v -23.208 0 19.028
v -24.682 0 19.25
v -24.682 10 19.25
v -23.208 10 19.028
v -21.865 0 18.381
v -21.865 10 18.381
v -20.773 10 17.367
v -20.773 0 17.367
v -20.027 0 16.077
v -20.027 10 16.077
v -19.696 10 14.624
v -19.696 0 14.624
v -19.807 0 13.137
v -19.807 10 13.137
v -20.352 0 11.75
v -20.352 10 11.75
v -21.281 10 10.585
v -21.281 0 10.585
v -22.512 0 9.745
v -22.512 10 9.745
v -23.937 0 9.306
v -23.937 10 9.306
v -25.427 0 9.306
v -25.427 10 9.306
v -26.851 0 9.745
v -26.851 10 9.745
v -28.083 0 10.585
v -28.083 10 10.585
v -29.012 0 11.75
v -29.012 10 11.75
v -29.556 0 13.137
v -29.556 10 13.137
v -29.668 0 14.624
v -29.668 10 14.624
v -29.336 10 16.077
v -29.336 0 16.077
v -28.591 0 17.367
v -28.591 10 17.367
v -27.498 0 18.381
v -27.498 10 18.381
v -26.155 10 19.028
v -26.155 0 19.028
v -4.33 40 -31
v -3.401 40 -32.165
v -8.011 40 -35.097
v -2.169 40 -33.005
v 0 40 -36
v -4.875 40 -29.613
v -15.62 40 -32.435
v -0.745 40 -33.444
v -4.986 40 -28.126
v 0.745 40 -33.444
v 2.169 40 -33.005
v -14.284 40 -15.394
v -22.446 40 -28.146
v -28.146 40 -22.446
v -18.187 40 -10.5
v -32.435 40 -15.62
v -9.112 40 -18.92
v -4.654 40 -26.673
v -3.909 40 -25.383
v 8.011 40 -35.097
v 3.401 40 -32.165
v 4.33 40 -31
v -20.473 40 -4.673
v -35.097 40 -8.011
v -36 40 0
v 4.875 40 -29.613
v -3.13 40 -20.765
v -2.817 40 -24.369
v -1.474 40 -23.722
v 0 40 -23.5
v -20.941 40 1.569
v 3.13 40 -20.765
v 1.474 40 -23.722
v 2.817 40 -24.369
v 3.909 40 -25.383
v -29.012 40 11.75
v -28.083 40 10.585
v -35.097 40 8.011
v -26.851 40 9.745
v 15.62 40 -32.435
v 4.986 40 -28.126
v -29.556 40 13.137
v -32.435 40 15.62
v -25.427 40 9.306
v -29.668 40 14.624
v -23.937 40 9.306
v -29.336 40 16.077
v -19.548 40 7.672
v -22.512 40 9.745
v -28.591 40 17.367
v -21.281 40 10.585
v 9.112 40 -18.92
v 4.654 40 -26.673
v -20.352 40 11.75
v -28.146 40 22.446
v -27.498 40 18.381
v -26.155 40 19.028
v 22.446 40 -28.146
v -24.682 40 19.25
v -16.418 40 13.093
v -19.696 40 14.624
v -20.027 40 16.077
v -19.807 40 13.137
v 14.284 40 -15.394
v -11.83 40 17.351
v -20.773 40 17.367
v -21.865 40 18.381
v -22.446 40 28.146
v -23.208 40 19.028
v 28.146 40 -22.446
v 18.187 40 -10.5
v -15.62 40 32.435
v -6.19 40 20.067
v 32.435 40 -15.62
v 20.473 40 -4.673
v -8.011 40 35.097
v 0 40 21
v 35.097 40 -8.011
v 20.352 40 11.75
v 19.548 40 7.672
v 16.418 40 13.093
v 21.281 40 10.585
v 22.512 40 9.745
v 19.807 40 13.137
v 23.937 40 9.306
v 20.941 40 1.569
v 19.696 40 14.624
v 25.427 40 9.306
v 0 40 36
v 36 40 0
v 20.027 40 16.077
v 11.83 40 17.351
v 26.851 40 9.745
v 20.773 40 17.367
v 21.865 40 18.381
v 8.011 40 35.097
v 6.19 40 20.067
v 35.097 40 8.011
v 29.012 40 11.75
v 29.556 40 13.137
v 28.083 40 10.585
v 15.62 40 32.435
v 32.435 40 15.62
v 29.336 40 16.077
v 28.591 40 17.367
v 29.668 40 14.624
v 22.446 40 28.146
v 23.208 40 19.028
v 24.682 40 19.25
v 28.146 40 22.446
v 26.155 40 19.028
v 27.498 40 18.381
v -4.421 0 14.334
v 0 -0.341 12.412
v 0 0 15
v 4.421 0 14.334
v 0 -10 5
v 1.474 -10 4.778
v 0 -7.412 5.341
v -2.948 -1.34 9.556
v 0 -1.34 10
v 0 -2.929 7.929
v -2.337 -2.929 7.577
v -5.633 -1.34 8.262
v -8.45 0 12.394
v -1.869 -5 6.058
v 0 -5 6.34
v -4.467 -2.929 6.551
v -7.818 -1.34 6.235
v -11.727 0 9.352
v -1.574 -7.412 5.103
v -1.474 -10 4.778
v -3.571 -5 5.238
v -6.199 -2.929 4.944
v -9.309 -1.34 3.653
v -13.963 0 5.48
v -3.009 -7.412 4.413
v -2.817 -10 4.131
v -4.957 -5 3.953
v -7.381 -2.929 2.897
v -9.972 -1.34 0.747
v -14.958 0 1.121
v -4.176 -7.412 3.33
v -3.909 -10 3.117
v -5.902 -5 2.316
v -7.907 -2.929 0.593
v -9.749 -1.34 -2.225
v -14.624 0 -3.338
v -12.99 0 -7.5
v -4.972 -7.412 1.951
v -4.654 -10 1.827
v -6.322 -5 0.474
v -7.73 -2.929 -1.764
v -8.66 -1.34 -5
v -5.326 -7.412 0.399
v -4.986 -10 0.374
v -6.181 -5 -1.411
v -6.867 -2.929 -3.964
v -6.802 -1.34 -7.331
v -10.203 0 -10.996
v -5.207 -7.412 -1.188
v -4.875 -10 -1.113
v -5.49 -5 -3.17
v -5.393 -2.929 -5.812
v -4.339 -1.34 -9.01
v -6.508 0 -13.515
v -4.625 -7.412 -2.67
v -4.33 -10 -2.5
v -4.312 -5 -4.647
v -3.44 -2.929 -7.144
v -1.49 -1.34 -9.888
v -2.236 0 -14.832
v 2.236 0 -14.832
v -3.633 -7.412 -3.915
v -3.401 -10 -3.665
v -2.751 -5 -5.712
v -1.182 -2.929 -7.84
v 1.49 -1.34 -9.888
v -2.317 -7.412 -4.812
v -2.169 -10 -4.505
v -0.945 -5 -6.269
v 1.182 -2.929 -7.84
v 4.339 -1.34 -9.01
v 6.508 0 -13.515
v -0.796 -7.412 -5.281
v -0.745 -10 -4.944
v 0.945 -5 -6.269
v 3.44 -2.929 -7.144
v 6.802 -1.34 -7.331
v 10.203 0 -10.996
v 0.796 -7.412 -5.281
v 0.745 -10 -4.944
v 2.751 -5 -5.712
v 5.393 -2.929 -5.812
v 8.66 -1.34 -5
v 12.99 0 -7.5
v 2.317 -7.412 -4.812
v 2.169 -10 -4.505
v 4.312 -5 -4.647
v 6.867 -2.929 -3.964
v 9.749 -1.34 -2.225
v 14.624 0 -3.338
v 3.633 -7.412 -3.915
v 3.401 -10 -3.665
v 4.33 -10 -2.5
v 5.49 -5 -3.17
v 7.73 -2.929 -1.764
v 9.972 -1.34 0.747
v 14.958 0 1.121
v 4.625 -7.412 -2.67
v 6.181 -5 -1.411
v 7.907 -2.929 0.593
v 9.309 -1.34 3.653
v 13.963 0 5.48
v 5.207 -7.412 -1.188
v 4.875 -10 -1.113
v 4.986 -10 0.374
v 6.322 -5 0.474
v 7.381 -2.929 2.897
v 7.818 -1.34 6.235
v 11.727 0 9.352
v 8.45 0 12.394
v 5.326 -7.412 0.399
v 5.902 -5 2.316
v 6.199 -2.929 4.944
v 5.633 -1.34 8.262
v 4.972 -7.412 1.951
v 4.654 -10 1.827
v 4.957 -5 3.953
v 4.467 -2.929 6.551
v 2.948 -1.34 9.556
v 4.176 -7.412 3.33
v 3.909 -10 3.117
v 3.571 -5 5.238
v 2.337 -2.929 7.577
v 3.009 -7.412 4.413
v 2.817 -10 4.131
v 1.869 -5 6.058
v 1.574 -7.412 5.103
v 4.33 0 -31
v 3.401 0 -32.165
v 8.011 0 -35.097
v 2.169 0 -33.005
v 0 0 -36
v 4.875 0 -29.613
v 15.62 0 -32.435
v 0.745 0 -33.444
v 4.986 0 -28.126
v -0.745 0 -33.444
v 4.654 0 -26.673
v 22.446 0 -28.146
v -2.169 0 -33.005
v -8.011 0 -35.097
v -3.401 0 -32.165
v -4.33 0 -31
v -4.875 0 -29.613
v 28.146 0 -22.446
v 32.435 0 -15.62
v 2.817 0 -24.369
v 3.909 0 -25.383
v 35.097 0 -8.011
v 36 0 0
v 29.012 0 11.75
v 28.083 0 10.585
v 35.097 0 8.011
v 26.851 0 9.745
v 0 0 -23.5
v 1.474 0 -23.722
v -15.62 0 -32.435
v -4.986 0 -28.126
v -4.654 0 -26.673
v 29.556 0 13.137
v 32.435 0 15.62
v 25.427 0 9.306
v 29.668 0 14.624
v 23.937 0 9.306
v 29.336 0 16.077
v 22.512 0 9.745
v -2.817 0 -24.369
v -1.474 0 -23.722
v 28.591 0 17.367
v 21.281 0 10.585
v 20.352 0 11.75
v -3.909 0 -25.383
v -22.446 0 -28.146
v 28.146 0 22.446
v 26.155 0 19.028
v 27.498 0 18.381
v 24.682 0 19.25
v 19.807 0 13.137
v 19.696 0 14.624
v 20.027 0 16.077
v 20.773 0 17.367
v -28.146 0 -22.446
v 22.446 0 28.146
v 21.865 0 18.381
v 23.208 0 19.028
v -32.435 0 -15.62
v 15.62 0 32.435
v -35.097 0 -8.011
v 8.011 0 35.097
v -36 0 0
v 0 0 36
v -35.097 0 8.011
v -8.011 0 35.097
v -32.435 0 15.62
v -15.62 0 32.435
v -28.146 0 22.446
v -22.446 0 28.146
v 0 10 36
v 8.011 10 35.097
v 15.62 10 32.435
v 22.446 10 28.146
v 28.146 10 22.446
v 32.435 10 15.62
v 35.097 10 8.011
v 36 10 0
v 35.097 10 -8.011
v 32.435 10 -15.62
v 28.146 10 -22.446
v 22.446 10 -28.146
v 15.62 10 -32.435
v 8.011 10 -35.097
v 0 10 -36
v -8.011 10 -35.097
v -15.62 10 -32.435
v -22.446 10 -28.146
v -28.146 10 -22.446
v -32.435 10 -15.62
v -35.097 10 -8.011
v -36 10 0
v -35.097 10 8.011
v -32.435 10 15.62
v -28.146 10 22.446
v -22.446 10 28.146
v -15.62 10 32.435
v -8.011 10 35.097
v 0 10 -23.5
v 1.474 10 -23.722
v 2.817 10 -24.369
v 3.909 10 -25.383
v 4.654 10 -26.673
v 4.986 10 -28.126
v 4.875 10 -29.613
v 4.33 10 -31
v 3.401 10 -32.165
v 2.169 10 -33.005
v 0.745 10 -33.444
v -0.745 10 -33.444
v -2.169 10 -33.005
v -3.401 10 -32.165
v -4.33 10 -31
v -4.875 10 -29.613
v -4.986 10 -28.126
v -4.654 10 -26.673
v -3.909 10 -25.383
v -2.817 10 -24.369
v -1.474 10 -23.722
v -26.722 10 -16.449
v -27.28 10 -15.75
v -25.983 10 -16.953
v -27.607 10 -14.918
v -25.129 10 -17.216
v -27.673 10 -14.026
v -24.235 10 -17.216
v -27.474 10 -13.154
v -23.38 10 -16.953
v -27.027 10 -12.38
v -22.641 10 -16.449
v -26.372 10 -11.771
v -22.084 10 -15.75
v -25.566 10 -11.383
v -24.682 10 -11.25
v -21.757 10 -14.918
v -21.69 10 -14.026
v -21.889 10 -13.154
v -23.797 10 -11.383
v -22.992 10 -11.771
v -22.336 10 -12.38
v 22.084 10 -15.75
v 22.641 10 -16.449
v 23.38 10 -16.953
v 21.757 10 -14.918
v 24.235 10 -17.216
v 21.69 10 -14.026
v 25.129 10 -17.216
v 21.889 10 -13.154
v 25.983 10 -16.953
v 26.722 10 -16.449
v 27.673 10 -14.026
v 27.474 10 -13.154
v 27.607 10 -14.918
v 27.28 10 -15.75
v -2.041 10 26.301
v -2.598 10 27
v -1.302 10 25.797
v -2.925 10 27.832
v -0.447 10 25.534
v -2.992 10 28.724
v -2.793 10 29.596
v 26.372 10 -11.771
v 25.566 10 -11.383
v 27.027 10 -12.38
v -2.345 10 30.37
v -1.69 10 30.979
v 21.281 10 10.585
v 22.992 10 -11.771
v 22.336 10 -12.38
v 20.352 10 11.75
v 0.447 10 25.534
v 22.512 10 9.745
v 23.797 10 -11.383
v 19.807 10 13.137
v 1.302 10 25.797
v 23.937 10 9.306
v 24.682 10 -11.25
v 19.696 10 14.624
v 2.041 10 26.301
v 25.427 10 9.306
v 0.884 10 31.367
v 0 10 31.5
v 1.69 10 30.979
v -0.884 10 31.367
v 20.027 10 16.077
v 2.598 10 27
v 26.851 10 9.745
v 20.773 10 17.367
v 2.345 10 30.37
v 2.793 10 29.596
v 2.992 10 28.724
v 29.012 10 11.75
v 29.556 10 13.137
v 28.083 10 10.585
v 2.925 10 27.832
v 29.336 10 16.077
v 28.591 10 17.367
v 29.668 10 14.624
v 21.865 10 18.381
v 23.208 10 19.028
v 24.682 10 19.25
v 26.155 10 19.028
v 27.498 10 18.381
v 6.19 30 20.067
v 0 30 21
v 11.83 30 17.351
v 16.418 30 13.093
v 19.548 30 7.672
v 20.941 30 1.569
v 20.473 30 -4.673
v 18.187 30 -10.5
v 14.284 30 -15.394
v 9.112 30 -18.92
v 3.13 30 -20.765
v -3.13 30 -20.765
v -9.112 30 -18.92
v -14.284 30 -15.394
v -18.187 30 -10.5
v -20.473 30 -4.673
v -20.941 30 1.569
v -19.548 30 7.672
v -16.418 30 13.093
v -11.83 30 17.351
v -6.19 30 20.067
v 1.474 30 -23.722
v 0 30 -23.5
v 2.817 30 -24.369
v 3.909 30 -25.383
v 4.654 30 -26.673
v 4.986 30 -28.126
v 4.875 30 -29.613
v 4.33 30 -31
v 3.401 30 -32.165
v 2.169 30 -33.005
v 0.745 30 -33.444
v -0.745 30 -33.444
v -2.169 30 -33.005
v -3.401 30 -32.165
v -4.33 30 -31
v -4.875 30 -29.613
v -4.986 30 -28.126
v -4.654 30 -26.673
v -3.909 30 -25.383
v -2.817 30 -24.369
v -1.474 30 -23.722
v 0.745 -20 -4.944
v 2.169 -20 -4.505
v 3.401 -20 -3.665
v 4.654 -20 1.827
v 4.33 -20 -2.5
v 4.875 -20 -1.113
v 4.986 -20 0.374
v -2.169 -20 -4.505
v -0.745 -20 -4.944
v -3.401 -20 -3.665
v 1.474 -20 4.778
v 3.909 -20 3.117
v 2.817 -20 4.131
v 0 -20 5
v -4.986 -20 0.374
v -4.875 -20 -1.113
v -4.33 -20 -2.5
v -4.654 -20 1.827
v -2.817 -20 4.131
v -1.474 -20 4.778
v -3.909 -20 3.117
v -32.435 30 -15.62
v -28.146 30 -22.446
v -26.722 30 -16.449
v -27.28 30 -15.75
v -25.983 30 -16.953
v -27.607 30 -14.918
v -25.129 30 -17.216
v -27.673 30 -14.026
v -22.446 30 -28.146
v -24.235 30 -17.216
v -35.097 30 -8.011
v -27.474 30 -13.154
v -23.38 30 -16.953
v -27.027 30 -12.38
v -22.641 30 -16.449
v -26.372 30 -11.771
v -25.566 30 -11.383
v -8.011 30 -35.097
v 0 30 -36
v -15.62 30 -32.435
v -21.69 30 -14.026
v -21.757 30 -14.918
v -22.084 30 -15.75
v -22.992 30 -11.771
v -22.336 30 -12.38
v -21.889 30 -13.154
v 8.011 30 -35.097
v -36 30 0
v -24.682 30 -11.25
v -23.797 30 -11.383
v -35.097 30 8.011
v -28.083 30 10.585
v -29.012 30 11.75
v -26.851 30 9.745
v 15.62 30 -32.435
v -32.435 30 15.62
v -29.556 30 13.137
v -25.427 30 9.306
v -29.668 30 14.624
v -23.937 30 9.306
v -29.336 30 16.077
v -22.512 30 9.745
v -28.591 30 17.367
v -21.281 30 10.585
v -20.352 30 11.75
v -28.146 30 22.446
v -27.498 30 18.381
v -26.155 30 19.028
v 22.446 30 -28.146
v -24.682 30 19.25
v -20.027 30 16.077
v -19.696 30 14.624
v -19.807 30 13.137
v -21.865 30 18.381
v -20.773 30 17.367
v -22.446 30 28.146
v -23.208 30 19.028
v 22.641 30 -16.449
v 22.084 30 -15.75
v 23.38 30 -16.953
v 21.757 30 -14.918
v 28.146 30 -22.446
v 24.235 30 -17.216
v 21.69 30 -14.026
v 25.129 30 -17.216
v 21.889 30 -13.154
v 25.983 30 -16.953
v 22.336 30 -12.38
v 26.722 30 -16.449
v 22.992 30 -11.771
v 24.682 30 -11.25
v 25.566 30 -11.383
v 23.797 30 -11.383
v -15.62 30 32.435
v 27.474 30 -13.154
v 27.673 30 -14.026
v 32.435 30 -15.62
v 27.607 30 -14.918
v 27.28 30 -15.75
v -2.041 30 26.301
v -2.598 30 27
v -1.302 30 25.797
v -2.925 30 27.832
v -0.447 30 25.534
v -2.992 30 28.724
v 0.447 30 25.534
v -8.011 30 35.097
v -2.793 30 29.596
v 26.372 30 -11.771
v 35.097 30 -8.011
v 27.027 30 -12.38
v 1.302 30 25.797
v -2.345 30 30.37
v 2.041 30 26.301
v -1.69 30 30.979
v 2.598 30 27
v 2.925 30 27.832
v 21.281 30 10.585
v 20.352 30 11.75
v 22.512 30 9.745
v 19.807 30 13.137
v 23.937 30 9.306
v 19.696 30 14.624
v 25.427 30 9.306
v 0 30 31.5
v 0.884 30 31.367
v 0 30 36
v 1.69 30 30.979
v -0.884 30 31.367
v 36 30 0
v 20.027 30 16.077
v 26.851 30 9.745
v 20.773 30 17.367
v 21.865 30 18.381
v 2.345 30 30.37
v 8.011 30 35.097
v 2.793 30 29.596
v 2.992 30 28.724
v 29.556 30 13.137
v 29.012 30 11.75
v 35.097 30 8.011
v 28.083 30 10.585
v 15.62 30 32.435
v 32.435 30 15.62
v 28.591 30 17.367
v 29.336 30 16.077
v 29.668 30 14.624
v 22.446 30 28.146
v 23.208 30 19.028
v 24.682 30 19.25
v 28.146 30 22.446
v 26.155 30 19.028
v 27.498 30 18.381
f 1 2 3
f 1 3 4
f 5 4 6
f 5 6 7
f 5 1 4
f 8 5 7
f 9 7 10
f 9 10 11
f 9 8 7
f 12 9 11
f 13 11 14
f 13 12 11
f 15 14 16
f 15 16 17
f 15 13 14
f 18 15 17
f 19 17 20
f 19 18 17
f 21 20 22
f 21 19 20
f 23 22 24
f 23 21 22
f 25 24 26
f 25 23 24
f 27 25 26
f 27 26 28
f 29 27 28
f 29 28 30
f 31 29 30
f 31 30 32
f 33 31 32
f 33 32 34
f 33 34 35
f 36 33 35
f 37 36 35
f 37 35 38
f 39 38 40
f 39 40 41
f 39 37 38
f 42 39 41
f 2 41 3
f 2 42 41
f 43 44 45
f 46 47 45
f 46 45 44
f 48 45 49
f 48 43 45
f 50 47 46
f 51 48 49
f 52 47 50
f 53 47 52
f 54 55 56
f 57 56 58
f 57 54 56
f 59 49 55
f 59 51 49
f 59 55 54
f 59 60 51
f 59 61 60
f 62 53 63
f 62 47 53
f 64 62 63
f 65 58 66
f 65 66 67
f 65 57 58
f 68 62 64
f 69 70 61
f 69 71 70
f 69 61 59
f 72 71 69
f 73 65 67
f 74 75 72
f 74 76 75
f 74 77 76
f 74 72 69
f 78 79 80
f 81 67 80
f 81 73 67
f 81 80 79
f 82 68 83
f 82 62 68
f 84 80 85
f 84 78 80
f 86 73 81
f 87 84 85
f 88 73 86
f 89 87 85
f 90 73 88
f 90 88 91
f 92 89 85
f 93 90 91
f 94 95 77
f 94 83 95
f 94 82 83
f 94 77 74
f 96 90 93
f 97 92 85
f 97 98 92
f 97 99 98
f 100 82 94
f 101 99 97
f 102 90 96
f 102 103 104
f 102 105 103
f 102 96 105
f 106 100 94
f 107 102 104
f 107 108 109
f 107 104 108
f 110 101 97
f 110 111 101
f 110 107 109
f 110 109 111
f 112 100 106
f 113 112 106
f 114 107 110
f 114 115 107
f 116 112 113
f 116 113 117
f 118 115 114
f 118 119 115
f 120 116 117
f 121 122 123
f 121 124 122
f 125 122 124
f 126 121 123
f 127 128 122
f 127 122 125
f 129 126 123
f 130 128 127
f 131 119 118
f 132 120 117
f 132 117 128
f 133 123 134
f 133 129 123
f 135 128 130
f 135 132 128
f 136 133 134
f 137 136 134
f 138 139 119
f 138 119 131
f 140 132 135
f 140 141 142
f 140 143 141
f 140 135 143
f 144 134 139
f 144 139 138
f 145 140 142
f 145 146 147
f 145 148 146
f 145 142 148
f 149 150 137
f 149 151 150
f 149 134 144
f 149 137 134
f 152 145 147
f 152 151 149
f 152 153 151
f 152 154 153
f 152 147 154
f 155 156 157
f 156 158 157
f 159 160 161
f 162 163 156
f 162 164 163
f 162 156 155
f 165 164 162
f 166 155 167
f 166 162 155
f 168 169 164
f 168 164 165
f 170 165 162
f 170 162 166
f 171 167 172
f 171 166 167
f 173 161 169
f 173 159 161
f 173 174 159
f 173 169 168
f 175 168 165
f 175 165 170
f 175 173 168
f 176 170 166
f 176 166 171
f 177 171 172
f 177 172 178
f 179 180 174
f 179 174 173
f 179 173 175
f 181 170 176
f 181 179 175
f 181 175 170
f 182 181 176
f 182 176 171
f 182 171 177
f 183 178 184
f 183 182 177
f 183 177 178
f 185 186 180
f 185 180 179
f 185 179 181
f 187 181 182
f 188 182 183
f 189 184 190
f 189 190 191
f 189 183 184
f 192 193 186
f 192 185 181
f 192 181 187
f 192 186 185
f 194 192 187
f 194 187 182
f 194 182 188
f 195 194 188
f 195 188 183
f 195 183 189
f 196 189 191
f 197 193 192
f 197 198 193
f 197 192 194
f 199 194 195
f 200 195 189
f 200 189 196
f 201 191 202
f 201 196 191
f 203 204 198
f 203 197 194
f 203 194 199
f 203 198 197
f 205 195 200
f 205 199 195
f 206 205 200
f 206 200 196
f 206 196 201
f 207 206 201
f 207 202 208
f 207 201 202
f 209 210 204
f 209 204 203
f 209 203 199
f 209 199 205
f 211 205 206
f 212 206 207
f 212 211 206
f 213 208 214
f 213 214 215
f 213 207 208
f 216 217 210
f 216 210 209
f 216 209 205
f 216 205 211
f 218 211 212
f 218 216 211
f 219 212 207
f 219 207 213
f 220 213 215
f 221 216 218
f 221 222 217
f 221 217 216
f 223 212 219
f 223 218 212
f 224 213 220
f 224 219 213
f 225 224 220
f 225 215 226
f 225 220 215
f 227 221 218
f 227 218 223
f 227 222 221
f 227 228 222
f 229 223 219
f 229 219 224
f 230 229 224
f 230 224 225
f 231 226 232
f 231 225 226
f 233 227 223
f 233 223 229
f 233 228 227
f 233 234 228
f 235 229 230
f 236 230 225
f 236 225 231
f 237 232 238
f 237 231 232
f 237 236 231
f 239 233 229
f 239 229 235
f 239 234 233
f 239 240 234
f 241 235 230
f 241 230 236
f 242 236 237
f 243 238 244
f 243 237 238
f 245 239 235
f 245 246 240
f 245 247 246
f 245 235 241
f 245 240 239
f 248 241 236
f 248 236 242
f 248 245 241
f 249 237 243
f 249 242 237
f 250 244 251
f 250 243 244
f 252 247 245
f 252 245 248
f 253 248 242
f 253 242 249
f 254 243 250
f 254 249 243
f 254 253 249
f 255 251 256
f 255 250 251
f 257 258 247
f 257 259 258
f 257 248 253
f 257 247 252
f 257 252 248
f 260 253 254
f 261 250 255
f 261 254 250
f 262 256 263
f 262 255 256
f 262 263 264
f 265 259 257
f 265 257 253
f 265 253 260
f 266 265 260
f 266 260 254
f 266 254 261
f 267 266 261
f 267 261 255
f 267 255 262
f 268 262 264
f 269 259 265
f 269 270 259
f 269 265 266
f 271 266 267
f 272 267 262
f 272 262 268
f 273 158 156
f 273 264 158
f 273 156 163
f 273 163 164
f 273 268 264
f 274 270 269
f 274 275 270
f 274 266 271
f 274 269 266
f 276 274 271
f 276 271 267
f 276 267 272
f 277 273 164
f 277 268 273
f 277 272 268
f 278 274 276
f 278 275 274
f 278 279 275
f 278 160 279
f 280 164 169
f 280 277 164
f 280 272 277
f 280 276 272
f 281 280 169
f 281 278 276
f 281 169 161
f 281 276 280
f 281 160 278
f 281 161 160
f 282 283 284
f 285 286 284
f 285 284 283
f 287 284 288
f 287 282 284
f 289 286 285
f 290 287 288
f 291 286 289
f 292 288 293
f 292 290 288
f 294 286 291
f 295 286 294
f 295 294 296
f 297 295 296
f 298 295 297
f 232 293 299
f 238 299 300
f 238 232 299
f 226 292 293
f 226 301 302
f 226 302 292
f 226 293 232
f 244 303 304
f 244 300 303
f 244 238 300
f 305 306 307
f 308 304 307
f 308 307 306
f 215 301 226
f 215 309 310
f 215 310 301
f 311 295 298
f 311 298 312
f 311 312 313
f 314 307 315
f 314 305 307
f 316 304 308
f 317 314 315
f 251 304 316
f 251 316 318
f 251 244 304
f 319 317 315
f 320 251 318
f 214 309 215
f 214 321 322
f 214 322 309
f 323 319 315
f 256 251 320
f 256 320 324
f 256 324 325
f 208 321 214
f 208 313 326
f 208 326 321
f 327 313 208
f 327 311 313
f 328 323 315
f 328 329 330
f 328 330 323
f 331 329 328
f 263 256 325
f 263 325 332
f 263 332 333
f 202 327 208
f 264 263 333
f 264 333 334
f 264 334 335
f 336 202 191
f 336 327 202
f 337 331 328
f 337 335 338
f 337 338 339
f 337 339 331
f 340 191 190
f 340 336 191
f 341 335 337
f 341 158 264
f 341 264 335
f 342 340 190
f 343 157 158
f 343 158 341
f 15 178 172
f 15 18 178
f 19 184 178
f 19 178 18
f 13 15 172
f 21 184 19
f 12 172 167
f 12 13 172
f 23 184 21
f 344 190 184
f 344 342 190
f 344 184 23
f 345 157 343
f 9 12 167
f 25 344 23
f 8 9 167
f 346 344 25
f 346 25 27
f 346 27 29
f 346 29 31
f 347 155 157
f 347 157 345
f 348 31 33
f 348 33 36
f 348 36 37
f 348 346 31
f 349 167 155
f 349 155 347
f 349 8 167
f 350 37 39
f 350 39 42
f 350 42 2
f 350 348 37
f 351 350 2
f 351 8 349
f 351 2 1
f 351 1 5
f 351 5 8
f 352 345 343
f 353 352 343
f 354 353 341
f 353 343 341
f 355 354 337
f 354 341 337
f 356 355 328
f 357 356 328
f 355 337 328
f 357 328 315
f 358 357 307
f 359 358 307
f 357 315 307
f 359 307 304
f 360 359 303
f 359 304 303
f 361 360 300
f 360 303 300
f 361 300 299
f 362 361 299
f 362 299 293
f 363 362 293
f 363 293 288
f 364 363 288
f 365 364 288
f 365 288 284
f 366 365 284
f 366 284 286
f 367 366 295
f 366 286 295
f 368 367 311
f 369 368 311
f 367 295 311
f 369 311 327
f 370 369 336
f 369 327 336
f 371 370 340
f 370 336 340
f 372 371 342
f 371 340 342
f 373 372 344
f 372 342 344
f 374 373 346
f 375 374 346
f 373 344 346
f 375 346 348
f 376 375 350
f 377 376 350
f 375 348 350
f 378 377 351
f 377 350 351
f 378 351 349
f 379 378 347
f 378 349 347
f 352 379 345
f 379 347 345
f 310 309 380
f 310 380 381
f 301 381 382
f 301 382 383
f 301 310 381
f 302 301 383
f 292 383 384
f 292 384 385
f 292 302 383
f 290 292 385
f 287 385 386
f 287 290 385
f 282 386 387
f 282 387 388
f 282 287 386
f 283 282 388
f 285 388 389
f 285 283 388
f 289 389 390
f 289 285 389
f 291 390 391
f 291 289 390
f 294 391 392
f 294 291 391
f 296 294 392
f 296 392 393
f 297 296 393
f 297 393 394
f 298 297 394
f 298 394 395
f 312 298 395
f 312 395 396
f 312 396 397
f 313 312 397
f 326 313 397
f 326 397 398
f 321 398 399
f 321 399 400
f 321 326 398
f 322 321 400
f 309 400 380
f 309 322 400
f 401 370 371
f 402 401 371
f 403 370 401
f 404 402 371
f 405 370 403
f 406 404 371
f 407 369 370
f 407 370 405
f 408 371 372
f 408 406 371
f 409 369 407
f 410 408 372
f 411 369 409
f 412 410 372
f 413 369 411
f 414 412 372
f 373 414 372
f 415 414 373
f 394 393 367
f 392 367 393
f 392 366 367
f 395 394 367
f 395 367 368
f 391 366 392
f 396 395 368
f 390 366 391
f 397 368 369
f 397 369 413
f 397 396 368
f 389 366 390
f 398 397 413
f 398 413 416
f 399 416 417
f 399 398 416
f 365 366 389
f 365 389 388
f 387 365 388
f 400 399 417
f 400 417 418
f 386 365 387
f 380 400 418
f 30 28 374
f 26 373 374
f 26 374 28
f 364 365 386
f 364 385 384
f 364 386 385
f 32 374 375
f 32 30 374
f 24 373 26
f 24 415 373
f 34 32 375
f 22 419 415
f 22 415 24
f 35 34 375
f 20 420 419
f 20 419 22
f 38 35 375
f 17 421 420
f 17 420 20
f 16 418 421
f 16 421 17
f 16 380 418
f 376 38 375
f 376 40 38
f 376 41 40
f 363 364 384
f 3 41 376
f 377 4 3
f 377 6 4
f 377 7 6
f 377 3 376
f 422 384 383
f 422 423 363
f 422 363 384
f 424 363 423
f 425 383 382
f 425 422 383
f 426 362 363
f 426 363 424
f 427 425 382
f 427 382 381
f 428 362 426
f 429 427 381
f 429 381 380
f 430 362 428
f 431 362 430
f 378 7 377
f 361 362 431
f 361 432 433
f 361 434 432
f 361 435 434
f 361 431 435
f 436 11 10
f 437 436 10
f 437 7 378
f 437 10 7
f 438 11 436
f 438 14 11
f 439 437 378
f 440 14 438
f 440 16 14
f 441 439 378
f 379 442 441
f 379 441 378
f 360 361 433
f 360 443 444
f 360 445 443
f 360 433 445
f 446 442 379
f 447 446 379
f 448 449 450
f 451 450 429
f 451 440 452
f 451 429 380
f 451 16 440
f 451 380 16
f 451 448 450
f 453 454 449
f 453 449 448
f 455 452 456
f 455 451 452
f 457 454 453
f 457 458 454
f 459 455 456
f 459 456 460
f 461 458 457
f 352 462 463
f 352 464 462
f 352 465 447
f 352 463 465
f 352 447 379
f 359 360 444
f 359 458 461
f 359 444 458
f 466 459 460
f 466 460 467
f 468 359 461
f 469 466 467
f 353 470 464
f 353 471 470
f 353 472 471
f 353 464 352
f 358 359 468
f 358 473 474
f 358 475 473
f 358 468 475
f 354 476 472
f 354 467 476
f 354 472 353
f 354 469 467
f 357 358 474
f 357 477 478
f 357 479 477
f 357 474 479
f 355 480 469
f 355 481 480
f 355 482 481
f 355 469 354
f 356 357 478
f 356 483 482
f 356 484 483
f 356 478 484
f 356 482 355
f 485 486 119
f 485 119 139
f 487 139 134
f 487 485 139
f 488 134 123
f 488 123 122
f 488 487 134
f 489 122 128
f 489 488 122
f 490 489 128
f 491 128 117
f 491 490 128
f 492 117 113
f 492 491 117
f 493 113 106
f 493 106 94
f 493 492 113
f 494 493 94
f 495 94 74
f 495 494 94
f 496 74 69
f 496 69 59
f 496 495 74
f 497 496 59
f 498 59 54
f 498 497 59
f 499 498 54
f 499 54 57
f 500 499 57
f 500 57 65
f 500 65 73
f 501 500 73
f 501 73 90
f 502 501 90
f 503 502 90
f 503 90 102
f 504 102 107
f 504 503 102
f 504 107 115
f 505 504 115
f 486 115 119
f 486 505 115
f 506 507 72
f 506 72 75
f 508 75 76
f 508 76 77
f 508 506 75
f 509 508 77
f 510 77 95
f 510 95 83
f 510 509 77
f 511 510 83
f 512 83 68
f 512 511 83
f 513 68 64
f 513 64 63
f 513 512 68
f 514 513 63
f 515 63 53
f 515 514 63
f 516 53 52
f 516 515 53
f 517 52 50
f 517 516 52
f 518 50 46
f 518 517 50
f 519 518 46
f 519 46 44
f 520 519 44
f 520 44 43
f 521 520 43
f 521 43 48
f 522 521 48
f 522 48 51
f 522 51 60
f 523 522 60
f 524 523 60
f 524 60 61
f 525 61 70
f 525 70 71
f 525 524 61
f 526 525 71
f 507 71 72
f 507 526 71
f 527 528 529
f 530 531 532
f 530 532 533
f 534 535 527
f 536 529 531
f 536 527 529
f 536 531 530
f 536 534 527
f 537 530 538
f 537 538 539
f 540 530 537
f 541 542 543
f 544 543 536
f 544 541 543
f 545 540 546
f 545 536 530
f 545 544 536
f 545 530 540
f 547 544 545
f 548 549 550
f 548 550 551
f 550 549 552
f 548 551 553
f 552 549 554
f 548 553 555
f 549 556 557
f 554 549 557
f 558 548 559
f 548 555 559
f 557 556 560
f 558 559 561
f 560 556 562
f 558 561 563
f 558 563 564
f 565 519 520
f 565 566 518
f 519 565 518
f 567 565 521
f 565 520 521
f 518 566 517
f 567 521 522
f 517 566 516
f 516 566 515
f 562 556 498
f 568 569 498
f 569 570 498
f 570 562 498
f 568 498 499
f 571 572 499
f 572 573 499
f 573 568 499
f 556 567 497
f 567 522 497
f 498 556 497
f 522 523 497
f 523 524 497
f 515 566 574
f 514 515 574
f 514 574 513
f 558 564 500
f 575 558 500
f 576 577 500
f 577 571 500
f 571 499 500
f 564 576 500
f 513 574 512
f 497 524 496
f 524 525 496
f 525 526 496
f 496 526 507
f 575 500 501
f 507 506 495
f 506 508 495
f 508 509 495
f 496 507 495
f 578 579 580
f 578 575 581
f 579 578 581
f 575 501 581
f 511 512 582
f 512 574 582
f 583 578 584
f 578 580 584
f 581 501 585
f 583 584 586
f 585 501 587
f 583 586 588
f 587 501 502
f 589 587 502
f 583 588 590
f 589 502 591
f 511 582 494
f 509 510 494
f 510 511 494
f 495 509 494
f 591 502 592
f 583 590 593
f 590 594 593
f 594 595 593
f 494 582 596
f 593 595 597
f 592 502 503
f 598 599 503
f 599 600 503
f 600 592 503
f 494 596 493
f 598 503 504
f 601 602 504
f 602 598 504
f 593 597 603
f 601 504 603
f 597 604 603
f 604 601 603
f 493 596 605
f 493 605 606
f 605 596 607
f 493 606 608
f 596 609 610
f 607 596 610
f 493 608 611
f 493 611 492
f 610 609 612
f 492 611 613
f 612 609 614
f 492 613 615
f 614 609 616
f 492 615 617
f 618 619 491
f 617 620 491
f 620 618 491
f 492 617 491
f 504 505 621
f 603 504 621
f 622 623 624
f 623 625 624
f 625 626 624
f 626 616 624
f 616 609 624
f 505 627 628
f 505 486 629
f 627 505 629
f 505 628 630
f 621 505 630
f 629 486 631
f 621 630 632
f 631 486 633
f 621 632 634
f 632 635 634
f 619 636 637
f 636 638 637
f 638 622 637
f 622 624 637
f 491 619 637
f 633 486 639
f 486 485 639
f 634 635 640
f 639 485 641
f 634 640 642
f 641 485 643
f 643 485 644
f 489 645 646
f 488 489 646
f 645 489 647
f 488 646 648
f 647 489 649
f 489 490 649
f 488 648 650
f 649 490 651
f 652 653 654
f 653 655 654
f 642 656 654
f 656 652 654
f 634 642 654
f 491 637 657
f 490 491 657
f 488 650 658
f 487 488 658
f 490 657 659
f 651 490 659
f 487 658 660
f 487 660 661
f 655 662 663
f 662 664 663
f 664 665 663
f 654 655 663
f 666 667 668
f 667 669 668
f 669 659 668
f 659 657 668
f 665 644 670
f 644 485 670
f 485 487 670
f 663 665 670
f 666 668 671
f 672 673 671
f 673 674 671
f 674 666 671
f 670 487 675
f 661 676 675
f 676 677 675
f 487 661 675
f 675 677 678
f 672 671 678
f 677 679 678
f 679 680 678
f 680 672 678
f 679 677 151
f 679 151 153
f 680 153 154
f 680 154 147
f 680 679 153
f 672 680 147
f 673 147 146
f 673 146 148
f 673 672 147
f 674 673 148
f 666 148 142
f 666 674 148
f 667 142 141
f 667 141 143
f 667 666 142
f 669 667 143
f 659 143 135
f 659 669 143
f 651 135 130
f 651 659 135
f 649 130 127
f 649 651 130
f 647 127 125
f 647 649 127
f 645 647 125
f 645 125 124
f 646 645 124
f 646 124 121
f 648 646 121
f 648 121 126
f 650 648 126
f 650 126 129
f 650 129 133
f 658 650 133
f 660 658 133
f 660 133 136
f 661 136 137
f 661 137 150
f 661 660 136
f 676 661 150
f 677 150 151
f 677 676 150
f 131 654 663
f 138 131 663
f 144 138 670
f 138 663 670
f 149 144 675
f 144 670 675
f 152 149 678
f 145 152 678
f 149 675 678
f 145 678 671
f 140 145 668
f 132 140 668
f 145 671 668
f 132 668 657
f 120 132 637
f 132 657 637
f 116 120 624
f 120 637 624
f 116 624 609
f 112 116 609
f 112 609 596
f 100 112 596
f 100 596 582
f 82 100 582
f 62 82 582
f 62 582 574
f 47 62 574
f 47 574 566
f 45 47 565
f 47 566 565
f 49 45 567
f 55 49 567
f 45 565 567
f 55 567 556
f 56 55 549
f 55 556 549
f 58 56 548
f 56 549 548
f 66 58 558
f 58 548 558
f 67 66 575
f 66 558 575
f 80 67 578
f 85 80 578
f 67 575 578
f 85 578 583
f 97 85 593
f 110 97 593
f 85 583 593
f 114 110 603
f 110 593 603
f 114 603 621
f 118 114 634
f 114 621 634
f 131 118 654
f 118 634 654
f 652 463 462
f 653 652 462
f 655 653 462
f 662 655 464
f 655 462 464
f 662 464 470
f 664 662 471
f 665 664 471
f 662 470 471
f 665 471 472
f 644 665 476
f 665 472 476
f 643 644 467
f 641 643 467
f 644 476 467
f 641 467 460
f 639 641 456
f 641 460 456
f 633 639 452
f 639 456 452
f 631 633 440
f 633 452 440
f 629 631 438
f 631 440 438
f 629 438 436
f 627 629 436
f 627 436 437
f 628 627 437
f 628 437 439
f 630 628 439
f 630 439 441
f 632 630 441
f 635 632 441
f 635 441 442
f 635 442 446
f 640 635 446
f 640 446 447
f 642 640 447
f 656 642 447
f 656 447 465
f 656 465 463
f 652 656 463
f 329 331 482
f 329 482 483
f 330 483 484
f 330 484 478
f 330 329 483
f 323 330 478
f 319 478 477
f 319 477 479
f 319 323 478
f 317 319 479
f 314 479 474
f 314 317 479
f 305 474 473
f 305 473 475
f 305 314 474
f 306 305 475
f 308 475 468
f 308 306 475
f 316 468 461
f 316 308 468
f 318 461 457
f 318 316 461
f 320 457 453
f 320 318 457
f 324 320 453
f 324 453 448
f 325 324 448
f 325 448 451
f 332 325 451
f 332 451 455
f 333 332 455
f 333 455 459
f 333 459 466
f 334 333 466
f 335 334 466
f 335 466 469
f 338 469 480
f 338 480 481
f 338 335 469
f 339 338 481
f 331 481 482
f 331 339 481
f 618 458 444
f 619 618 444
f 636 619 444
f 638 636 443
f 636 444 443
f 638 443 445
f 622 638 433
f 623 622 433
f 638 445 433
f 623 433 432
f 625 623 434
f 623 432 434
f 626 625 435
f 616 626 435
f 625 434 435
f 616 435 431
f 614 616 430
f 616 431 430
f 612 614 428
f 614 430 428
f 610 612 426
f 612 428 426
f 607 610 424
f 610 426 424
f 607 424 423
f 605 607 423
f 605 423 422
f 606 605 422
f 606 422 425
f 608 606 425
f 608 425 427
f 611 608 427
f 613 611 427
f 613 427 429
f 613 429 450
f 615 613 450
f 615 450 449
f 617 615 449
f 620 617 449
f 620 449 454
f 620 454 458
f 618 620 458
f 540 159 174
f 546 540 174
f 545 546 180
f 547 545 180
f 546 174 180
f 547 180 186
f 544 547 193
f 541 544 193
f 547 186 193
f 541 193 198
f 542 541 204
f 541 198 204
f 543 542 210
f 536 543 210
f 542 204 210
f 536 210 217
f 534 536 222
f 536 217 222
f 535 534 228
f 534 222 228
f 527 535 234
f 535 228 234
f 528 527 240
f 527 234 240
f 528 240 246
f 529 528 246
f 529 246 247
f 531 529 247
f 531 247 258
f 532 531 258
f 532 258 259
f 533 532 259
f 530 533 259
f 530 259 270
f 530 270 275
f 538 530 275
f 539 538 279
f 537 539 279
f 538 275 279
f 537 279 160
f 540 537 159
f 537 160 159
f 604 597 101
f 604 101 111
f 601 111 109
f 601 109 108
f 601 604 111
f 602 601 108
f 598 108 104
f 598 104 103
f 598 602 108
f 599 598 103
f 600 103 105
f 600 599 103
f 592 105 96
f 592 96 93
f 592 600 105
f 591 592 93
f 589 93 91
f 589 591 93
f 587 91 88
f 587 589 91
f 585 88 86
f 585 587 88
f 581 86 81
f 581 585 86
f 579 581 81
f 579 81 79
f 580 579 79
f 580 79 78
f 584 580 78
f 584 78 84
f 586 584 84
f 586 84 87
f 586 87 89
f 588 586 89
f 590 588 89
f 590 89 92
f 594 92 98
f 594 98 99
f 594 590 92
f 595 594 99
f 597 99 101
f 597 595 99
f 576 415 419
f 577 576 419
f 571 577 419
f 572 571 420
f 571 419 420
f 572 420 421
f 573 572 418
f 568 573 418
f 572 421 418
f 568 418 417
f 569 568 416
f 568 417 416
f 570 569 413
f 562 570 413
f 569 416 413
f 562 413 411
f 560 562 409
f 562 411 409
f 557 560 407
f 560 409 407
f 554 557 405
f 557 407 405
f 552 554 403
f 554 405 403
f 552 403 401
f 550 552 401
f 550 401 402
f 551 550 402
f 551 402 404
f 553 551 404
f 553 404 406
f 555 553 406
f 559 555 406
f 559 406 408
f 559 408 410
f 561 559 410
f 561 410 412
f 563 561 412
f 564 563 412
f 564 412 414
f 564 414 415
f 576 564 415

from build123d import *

# Parameters (mm, degrees)
SKETCH1_R           = 36
SKETCH1_R_2         = 5
SKETCH1_R_3         = 3
SKETCH1_R_4         = 21
BOSS_EXTRUDE1_DEPTH = 10
SKETCH1_3_R         = 3
BOSS_EXTRUDE2_DEPTH = 40
LPATTERN3_COUNT     = 2
LPATTERN3_PITCH     = 30
SKETCH2_R           = 21
BOSS_EXTRUDE3_DEPTH = 10
SKETCH4_R           = 5
BOSS_EXTRUDE4_DEPTH = 20
FILLET1_R           = 10


with BuildPart() as part:
    # Sketch1 → Boss-Extrude1 (new body)
    with BuildSketch(Plane(origin=(0, 0, 0), x_dir=(1, 0, 0), z_dir=(0, 1, 0))):
        Circle(SKETCH1_R)
        with Locations((0, 28.5)):
            Circle(SKETCH1_R_2, mode=Mode.SUBTRACT)
        with Locations((24.681724008, 14.25)):
            Circle(SKETCH1_R_3, mode=Mode.SUBTRACT)
        with Locations((24.681724008, -14.25)):
            Circle(SKETCH1_R_2, mode=Mode.SUBTRACT)
        with Locations((0, -28.5)):
            Circle(SKETCH1_R_3, mode=Mode.SUBTRACT)
        with Locations((-24.681724008, -14.25)):
            Circle(SKETCH1_R_2, mode=Mode.SUBTRACT)
        with Locations((-24.681724008, 14.25)):
            Circle(SKETCH1_R_3, mode=Mode.SUBTRACT)
        Circle(SKETCH1_R_4, mode=Mode.SUBTRACT)
    boss_extrude1 = extrude(amount=BOSS_EXTRUDE1_DEPTH)

    # Sketch1<3> → Boss-Extrude2 (add)
    with BuildSketch(Plane(origin=(0, 0, 0), x_dir=(1, 0, 0), z_dir=(0, 1, 0))):
        with Locations((0, -28.5)):
            Circle(SKETCH1_3_R)
        with Locations((-24.681724008, 14.25)):
            Circle(SKETCH1_3_R)
        with Locations((24.681724008, 14.25)):
            Circle(SKETCH1_3_R)
    extrude(amount=BOSS_EXTRUDE2_DEPTH)

    # LPattern3: Boss-Extrude1 ×2
    with Locations(*[(0, i * LPATTERN3_PITCH, 0) for i in range(1, LPATTERN3_COUNT)]):
        add(boss_extrude1)

    # Sketch2 → Boss-Extrude3 (add)
    with BuildSketch(Plane.XZ):
        Circle(SKETCH2_R)
    extrude(amount=-BOSS_EXTRUDE3_DEPTH)

    # Sketch4 → Boss-Extrude4 (add)
    with BuildSketch(Plane.XZ):
        Circle(SKETCH4_R)
    extrude(amount=BOSS_EXTRUDE4_DEPTH)

    # Fillet1
    fillet1_edges = [part.edges().sort_by_distance(p)[0] for p in [
        (-5, 0, 0),
    ]]
    fillet(fillet1_edges, radius=FILLET1_R)


solid = part.part
